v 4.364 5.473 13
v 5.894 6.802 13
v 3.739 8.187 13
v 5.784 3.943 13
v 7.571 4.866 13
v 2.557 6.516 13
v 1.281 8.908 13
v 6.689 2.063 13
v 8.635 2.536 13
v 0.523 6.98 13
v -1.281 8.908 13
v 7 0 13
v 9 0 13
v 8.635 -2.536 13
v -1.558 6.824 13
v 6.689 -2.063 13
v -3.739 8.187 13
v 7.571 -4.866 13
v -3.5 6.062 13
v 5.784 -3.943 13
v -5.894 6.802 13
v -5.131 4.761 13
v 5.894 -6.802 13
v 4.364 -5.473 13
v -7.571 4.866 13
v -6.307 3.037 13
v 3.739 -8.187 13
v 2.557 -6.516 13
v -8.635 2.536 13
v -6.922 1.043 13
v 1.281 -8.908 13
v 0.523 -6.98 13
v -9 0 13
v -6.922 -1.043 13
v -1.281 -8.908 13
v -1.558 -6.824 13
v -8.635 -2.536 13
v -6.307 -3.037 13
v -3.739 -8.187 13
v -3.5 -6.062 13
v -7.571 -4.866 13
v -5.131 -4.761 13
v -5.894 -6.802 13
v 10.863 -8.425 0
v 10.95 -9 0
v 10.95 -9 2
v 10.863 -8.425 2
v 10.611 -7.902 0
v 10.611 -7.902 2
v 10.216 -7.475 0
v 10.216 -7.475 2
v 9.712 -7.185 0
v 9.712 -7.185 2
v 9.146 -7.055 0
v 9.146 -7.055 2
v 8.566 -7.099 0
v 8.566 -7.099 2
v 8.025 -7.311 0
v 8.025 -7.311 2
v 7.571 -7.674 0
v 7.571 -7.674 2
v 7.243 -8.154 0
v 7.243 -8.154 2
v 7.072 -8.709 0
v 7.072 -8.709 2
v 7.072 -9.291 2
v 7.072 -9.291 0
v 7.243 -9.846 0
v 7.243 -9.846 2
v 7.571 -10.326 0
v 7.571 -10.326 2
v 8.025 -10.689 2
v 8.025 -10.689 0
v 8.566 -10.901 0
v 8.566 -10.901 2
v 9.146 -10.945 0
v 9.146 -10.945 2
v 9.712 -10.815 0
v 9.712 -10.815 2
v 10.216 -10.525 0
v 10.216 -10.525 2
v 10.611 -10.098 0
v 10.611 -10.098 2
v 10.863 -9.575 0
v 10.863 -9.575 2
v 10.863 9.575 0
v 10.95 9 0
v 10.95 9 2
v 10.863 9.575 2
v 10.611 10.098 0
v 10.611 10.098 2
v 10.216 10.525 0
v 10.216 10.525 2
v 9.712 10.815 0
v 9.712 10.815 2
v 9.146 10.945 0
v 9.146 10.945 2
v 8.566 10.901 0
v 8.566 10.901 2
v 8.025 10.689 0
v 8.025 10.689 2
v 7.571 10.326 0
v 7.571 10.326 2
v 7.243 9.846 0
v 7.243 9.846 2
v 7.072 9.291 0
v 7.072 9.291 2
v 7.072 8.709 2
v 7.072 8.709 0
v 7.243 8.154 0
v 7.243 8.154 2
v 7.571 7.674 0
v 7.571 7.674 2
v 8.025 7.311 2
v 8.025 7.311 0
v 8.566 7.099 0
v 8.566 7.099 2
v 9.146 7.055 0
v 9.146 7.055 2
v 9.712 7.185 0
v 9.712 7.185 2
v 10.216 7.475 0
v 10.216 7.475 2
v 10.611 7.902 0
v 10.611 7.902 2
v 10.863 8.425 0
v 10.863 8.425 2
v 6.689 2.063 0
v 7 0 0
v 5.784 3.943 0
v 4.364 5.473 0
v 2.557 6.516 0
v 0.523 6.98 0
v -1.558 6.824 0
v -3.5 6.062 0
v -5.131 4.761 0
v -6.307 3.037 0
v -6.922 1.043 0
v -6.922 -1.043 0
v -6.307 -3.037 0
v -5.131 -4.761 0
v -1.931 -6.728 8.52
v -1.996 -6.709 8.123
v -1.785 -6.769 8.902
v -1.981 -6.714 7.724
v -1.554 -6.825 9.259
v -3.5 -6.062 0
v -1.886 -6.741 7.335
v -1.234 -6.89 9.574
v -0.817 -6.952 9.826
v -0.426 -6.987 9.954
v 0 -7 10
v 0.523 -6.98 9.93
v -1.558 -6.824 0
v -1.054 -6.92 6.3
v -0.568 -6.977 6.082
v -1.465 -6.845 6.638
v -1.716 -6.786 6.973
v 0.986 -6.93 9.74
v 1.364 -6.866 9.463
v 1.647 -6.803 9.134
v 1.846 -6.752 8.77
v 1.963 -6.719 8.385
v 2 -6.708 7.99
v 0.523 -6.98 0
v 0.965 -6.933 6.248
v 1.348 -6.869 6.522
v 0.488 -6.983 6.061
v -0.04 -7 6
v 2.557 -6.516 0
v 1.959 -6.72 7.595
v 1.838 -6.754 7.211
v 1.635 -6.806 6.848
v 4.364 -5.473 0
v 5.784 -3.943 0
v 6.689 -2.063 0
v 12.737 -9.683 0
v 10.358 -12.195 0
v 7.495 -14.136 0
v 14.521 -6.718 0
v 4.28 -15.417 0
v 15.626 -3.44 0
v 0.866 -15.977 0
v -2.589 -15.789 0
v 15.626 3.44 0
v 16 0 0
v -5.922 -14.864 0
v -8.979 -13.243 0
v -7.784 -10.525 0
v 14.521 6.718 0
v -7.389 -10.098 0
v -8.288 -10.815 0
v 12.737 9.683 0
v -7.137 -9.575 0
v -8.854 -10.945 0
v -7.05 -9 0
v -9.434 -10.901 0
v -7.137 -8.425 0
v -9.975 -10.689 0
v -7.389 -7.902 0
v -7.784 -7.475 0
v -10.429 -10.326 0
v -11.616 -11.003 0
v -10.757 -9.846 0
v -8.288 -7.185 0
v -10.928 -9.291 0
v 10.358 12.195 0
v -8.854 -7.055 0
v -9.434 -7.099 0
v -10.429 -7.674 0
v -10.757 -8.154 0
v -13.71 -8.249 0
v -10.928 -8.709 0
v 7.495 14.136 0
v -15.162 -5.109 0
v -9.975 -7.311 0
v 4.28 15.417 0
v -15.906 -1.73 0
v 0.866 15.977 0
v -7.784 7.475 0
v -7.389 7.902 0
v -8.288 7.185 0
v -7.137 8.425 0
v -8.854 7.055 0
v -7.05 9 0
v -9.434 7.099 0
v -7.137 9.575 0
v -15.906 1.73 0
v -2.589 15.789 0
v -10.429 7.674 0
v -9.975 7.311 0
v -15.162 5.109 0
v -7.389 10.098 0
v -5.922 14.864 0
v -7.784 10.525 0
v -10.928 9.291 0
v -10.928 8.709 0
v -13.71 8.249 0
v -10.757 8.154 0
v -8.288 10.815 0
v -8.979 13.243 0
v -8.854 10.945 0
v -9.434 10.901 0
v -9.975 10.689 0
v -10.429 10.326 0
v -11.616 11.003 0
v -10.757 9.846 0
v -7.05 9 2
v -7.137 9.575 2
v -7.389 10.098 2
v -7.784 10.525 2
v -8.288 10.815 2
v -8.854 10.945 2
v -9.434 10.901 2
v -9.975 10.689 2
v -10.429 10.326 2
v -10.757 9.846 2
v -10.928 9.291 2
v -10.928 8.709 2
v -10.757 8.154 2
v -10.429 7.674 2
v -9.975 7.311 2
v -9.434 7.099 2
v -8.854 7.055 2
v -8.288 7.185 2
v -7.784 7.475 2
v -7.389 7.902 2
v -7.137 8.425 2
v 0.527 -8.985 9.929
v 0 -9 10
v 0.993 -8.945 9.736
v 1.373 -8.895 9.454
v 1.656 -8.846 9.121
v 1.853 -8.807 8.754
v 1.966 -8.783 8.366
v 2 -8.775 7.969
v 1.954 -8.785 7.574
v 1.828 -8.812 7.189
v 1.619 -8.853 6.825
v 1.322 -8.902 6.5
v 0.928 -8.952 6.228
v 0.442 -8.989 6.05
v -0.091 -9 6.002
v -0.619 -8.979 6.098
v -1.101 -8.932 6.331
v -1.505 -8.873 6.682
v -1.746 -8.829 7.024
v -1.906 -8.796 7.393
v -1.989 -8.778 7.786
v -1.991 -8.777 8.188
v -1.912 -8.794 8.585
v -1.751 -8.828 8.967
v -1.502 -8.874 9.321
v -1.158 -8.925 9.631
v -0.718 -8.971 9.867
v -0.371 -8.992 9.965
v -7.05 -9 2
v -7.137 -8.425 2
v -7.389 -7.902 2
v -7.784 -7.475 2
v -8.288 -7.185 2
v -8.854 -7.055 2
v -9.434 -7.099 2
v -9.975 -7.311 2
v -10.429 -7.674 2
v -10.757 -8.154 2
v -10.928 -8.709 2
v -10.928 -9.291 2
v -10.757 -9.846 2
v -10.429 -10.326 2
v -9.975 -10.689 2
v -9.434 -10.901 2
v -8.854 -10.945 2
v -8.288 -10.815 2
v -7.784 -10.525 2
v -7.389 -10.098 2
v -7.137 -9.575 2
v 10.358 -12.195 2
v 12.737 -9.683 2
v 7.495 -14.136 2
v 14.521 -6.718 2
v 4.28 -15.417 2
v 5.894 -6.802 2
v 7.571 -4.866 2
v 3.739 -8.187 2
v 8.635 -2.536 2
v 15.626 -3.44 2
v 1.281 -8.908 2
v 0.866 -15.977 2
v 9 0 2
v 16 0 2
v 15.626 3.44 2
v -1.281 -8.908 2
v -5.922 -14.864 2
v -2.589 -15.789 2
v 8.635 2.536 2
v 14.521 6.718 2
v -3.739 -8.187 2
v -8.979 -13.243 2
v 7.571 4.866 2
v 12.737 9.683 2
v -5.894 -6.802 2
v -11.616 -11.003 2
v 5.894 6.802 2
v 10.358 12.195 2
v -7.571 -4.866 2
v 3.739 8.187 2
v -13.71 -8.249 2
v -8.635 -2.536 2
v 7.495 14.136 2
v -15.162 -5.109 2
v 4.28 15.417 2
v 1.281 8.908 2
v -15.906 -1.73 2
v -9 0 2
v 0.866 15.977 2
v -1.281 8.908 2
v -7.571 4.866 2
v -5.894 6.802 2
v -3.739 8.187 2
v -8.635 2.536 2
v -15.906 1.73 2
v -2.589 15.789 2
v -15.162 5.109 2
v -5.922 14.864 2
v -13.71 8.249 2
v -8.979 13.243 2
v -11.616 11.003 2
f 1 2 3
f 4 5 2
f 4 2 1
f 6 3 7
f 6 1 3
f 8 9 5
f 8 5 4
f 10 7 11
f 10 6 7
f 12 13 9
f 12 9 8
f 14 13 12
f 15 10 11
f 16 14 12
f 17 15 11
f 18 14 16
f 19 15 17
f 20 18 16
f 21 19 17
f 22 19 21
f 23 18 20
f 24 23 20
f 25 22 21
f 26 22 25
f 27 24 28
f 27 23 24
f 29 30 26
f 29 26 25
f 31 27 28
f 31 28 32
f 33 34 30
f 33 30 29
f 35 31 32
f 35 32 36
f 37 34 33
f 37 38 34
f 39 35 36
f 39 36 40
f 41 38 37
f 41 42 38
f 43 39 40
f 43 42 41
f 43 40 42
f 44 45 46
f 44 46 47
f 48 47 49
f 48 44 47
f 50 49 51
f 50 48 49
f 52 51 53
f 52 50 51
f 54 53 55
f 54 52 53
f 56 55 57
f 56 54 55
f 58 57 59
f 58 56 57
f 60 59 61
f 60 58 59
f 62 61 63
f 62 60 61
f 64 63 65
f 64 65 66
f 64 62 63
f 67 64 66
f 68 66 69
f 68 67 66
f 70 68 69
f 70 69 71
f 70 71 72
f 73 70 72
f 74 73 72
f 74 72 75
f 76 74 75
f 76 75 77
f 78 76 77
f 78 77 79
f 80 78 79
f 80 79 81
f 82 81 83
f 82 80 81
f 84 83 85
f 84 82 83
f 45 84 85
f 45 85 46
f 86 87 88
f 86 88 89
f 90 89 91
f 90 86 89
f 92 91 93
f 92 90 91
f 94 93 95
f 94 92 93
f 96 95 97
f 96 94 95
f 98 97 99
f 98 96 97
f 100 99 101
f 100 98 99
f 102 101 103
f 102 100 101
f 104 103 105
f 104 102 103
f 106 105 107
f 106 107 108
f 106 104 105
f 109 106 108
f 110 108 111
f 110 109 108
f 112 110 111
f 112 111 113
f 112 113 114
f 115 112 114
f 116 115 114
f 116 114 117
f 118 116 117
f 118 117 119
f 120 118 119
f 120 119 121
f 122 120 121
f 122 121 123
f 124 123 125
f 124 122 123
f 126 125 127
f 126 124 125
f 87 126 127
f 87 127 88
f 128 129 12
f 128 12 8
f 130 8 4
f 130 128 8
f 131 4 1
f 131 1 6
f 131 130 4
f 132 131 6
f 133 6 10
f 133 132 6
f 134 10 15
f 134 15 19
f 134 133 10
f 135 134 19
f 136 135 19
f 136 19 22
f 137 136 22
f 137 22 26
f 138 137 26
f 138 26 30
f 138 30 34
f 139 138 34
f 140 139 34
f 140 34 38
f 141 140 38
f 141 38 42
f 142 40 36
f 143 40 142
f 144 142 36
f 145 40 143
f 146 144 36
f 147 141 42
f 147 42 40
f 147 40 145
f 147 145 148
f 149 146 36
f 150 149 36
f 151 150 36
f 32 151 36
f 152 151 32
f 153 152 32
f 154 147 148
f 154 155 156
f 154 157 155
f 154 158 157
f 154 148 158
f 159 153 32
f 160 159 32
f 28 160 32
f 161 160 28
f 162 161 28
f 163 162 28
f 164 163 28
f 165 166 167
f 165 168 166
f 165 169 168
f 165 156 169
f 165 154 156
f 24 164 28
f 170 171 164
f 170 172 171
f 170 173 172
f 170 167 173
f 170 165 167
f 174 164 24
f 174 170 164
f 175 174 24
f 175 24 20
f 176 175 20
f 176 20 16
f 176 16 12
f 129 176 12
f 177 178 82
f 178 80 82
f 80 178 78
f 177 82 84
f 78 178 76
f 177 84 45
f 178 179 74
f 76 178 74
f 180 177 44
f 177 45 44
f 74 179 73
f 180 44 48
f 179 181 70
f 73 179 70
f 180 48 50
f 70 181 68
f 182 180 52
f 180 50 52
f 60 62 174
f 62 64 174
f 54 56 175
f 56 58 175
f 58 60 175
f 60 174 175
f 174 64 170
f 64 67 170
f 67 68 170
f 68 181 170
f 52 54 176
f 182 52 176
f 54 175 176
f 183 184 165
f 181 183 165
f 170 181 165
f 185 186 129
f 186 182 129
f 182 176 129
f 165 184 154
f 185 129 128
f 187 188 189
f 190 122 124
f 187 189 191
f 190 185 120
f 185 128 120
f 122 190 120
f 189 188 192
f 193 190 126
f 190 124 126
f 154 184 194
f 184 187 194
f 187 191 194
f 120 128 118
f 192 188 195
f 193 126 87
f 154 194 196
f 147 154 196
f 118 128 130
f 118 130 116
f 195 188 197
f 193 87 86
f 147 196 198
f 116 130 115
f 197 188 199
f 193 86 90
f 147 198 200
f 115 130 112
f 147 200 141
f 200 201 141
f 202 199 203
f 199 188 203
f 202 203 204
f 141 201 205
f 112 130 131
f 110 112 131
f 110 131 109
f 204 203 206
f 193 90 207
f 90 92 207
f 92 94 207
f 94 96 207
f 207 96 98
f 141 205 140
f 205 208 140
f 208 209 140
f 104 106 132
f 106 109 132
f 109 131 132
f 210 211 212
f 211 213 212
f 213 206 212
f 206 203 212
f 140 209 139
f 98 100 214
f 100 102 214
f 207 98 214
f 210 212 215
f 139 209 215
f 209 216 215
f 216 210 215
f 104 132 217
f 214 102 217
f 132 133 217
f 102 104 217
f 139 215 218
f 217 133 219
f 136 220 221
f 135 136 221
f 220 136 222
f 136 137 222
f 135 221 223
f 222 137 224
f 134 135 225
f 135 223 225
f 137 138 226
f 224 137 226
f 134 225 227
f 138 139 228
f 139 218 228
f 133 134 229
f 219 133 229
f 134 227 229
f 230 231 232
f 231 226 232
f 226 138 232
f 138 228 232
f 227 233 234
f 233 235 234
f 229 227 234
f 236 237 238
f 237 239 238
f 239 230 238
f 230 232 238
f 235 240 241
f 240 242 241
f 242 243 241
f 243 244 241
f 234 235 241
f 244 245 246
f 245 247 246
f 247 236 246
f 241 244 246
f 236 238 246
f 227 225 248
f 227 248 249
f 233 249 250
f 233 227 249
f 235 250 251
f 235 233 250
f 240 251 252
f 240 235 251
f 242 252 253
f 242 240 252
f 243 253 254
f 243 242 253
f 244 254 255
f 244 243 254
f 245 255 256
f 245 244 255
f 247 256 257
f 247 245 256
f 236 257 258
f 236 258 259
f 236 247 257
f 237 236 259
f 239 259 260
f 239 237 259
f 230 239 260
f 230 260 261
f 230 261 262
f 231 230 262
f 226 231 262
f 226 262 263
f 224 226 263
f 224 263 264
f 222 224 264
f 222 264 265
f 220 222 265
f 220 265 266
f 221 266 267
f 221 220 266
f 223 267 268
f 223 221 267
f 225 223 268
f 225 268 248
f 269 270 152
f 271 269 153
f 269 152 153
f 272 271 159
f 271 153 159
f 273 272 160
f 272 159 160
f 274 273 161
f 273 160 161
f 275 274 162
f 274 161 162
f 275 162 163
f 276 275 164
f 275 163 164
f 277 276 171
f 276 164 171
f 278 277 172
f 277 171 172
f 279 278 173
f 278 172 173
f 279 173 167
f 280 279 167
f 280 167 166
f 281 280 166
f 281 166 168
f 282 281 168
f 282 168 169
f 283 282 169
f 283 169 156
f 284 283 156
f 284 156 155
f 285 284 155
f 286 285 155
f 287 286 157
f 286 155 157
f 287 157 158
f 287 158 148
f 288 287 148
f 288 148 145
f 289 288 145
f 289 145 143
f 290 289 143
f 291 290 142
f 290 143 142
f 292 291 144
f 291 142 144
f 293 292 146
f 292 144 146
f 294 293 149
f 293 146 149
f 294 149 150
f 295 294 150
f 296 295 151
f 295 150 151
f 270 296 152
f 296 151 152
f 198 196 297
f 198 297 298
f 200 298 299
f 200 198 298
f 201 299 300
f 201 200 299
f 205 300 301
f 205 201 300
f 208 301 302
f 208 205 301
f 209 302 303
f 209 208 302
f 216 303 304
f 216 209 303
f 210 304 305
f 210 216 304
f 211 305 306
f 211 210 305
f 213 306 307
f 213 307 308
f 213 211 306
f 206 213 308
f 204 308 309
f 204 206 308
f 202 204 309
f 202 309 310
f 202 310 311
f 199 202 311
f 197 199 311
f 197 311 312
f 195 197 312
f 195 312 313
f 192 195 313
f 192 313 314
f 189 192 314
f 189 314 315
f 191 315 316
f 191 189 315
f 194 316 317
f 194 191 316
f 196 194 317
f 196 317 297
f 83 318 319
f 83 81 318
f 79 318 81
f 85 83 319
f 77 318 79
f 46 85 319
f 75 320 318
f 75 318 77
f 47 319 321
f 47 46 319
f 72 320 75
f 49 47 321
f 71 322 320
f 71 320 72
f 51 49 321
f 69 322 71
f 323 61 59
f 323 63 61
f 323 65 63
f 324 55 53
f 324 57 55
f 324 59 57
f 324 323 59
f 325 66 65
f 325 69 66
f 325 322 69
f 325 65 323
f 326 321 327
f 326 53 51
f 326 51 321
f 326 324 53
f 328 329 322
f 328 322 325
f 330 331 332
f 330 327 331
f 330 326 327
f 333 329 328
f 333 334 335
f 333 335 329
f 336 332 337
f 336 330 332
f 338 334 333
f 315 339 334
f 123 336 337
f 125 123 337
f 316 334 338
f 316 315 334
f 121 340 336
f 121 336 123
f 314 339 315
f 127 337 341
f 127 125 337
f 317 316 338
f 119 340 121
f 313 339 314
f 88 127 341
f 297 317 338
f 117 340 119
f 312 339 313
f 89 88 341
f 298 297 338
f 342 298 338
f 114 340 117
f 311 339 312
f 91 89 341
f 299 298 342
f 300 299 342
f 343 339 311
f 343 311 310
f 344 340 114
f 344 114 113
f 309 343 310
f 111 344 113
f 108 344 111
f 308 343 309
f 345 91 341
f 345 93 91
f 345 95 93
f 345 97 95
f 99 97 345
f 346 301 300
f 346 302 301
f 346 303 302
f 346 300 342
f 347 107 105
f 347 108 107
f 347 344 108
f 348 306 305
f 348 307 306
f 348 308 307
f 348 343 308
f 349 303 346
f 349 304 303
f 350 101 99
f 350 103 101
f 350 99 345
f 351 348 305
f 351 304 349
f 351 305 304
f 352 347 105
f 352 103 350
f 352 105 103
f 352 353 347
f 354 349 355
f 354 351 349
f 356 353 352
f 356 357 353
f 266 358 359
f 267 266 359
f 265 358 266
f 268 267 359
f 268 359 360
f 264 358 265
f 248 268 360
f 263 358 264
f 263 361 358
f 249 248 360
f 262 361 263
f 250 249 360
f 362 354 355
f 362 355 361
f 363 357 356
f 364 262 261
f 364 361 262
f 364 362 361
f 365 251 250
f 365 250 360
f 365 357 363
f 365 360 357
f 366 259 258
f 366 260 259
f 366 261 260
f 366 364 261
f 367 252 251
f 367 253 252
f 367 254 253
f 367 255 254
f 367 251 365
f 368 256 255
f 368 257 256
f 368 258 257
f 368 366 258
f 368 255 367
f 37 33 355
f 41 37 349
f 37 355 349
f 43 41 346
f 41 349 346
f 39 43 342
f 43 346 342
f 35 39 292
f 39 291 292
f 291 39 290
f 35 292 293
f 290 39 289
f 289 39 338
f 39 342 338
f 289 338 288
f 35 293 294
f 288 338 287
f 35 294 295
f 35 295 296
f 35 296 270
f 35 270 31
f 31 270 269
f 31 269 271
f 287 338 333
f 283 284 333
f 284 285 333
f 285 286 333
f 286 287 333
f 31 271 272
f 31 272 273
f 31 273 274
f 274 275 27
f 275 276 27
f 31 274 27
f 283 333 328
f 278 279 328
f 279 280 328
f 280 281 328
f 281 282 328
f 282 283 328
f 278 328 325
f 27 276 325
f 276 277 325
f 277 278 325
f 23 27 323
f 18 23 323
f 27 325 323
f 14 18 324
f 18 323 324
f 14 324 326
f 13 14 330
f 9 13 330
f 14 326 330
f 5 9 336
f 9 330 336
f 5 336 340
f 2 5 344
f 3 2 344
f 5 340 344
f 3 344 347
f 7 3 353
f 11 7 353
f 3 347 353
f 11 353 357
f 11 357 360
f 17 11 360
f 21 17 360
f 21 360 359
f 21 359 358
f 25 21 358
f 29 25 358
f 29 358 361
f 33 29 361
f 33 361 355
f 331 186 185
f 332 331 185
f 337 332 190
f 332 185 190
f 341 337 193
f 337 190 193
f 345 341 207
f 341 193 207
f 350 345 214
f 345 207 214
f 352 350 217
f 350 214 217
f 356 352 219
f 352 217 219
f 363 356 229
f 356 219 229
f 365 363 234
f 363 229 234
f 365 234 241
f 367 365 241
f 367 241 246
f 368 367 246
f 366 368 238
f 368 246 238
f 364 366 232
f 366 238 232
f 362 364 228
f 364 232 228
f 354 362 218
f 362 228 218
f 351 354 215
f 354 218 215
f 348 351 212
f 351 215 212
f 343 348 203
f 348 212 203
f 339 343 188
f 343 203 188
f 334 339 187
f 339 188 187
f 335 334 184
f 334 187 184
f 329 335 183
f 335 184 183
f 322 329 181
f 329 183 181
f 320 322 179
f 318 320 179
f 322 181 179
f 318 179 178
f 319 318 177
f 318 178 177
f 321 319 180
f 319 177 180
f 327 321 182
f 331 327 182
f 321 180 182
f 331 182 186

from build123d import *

# Parameters (mm, degrees)
SKETCH1_R           = 16
SKETCH1_R_2         = 1.95
SKETCH1_R_3         = 7
BOSS_EXTRUDE1_DEPTH = 2
SKETCH1_3_R         = 9
SKETCH1_3_R_2       = 7
BOSS_EXTRUDE2_DEPTH = 13
SKETCH2_R           = 2
CUT_EXTRUDE1_DEPTH  = 13


with BuildPart() as part:
    # Sketch1 → Boss-Extrude1 (new body)
    with BuildSketch(Plane(origin=(0, 0, 0), x_dir=(0, 1, 0), z_dir=(0, 0, 1))):
        Circle(SKETCH1_R)
        with Locations((-9, -9)):
            Circle(SKETCH1_R_2, mode=Mode.SUBTRACT)
        with Locations((9, -9)):
            Circle(SKETCH1_R_2, mode=Mode.SUBTRACT)
        with Locations((-9, 9)):
            Circle(SKETCH1_R_2, mode=Mode.SUBTRACT)
        with Locations((9, 9)):
            Circle(SKETCH1_R_2, mode=Mode.SUBTRACT)
        Circle(SKETCH1_R_3, mode=Mode.SUBTRACT)
    extrude(amount=BOSS_EXTRUDE1_DEPTH)

    # Sketch1<3> → Boss-Extrude2 (add)
    with BuildSketch(Plane(origin=(0, 0, 0), x_dir=(0, 1, 0), z_dir=(0, 0, 1))):
        Circle(SKETCH1_3_R)
        Circle(SKETCH1_3_R_2, mode=Mode.SUBTRACT)
    extrude(amount=BOSS_EXTRUDE2_DEPTH)

    # Sketch2 → Cut-Extrude1 (cut)
    with BuildSketch(Plane(origin=(0, 0, 0), x_dir=(-1, 0, 0), z_dir=(0, 1, 0))):
        with Locations((0, 8)):
            Circle(SKETCH2_R)
    extrude(amount=-CUT_EXTRUDE1_DEPTH, mode=Mode.SUBTRACT)


solid = part.part
